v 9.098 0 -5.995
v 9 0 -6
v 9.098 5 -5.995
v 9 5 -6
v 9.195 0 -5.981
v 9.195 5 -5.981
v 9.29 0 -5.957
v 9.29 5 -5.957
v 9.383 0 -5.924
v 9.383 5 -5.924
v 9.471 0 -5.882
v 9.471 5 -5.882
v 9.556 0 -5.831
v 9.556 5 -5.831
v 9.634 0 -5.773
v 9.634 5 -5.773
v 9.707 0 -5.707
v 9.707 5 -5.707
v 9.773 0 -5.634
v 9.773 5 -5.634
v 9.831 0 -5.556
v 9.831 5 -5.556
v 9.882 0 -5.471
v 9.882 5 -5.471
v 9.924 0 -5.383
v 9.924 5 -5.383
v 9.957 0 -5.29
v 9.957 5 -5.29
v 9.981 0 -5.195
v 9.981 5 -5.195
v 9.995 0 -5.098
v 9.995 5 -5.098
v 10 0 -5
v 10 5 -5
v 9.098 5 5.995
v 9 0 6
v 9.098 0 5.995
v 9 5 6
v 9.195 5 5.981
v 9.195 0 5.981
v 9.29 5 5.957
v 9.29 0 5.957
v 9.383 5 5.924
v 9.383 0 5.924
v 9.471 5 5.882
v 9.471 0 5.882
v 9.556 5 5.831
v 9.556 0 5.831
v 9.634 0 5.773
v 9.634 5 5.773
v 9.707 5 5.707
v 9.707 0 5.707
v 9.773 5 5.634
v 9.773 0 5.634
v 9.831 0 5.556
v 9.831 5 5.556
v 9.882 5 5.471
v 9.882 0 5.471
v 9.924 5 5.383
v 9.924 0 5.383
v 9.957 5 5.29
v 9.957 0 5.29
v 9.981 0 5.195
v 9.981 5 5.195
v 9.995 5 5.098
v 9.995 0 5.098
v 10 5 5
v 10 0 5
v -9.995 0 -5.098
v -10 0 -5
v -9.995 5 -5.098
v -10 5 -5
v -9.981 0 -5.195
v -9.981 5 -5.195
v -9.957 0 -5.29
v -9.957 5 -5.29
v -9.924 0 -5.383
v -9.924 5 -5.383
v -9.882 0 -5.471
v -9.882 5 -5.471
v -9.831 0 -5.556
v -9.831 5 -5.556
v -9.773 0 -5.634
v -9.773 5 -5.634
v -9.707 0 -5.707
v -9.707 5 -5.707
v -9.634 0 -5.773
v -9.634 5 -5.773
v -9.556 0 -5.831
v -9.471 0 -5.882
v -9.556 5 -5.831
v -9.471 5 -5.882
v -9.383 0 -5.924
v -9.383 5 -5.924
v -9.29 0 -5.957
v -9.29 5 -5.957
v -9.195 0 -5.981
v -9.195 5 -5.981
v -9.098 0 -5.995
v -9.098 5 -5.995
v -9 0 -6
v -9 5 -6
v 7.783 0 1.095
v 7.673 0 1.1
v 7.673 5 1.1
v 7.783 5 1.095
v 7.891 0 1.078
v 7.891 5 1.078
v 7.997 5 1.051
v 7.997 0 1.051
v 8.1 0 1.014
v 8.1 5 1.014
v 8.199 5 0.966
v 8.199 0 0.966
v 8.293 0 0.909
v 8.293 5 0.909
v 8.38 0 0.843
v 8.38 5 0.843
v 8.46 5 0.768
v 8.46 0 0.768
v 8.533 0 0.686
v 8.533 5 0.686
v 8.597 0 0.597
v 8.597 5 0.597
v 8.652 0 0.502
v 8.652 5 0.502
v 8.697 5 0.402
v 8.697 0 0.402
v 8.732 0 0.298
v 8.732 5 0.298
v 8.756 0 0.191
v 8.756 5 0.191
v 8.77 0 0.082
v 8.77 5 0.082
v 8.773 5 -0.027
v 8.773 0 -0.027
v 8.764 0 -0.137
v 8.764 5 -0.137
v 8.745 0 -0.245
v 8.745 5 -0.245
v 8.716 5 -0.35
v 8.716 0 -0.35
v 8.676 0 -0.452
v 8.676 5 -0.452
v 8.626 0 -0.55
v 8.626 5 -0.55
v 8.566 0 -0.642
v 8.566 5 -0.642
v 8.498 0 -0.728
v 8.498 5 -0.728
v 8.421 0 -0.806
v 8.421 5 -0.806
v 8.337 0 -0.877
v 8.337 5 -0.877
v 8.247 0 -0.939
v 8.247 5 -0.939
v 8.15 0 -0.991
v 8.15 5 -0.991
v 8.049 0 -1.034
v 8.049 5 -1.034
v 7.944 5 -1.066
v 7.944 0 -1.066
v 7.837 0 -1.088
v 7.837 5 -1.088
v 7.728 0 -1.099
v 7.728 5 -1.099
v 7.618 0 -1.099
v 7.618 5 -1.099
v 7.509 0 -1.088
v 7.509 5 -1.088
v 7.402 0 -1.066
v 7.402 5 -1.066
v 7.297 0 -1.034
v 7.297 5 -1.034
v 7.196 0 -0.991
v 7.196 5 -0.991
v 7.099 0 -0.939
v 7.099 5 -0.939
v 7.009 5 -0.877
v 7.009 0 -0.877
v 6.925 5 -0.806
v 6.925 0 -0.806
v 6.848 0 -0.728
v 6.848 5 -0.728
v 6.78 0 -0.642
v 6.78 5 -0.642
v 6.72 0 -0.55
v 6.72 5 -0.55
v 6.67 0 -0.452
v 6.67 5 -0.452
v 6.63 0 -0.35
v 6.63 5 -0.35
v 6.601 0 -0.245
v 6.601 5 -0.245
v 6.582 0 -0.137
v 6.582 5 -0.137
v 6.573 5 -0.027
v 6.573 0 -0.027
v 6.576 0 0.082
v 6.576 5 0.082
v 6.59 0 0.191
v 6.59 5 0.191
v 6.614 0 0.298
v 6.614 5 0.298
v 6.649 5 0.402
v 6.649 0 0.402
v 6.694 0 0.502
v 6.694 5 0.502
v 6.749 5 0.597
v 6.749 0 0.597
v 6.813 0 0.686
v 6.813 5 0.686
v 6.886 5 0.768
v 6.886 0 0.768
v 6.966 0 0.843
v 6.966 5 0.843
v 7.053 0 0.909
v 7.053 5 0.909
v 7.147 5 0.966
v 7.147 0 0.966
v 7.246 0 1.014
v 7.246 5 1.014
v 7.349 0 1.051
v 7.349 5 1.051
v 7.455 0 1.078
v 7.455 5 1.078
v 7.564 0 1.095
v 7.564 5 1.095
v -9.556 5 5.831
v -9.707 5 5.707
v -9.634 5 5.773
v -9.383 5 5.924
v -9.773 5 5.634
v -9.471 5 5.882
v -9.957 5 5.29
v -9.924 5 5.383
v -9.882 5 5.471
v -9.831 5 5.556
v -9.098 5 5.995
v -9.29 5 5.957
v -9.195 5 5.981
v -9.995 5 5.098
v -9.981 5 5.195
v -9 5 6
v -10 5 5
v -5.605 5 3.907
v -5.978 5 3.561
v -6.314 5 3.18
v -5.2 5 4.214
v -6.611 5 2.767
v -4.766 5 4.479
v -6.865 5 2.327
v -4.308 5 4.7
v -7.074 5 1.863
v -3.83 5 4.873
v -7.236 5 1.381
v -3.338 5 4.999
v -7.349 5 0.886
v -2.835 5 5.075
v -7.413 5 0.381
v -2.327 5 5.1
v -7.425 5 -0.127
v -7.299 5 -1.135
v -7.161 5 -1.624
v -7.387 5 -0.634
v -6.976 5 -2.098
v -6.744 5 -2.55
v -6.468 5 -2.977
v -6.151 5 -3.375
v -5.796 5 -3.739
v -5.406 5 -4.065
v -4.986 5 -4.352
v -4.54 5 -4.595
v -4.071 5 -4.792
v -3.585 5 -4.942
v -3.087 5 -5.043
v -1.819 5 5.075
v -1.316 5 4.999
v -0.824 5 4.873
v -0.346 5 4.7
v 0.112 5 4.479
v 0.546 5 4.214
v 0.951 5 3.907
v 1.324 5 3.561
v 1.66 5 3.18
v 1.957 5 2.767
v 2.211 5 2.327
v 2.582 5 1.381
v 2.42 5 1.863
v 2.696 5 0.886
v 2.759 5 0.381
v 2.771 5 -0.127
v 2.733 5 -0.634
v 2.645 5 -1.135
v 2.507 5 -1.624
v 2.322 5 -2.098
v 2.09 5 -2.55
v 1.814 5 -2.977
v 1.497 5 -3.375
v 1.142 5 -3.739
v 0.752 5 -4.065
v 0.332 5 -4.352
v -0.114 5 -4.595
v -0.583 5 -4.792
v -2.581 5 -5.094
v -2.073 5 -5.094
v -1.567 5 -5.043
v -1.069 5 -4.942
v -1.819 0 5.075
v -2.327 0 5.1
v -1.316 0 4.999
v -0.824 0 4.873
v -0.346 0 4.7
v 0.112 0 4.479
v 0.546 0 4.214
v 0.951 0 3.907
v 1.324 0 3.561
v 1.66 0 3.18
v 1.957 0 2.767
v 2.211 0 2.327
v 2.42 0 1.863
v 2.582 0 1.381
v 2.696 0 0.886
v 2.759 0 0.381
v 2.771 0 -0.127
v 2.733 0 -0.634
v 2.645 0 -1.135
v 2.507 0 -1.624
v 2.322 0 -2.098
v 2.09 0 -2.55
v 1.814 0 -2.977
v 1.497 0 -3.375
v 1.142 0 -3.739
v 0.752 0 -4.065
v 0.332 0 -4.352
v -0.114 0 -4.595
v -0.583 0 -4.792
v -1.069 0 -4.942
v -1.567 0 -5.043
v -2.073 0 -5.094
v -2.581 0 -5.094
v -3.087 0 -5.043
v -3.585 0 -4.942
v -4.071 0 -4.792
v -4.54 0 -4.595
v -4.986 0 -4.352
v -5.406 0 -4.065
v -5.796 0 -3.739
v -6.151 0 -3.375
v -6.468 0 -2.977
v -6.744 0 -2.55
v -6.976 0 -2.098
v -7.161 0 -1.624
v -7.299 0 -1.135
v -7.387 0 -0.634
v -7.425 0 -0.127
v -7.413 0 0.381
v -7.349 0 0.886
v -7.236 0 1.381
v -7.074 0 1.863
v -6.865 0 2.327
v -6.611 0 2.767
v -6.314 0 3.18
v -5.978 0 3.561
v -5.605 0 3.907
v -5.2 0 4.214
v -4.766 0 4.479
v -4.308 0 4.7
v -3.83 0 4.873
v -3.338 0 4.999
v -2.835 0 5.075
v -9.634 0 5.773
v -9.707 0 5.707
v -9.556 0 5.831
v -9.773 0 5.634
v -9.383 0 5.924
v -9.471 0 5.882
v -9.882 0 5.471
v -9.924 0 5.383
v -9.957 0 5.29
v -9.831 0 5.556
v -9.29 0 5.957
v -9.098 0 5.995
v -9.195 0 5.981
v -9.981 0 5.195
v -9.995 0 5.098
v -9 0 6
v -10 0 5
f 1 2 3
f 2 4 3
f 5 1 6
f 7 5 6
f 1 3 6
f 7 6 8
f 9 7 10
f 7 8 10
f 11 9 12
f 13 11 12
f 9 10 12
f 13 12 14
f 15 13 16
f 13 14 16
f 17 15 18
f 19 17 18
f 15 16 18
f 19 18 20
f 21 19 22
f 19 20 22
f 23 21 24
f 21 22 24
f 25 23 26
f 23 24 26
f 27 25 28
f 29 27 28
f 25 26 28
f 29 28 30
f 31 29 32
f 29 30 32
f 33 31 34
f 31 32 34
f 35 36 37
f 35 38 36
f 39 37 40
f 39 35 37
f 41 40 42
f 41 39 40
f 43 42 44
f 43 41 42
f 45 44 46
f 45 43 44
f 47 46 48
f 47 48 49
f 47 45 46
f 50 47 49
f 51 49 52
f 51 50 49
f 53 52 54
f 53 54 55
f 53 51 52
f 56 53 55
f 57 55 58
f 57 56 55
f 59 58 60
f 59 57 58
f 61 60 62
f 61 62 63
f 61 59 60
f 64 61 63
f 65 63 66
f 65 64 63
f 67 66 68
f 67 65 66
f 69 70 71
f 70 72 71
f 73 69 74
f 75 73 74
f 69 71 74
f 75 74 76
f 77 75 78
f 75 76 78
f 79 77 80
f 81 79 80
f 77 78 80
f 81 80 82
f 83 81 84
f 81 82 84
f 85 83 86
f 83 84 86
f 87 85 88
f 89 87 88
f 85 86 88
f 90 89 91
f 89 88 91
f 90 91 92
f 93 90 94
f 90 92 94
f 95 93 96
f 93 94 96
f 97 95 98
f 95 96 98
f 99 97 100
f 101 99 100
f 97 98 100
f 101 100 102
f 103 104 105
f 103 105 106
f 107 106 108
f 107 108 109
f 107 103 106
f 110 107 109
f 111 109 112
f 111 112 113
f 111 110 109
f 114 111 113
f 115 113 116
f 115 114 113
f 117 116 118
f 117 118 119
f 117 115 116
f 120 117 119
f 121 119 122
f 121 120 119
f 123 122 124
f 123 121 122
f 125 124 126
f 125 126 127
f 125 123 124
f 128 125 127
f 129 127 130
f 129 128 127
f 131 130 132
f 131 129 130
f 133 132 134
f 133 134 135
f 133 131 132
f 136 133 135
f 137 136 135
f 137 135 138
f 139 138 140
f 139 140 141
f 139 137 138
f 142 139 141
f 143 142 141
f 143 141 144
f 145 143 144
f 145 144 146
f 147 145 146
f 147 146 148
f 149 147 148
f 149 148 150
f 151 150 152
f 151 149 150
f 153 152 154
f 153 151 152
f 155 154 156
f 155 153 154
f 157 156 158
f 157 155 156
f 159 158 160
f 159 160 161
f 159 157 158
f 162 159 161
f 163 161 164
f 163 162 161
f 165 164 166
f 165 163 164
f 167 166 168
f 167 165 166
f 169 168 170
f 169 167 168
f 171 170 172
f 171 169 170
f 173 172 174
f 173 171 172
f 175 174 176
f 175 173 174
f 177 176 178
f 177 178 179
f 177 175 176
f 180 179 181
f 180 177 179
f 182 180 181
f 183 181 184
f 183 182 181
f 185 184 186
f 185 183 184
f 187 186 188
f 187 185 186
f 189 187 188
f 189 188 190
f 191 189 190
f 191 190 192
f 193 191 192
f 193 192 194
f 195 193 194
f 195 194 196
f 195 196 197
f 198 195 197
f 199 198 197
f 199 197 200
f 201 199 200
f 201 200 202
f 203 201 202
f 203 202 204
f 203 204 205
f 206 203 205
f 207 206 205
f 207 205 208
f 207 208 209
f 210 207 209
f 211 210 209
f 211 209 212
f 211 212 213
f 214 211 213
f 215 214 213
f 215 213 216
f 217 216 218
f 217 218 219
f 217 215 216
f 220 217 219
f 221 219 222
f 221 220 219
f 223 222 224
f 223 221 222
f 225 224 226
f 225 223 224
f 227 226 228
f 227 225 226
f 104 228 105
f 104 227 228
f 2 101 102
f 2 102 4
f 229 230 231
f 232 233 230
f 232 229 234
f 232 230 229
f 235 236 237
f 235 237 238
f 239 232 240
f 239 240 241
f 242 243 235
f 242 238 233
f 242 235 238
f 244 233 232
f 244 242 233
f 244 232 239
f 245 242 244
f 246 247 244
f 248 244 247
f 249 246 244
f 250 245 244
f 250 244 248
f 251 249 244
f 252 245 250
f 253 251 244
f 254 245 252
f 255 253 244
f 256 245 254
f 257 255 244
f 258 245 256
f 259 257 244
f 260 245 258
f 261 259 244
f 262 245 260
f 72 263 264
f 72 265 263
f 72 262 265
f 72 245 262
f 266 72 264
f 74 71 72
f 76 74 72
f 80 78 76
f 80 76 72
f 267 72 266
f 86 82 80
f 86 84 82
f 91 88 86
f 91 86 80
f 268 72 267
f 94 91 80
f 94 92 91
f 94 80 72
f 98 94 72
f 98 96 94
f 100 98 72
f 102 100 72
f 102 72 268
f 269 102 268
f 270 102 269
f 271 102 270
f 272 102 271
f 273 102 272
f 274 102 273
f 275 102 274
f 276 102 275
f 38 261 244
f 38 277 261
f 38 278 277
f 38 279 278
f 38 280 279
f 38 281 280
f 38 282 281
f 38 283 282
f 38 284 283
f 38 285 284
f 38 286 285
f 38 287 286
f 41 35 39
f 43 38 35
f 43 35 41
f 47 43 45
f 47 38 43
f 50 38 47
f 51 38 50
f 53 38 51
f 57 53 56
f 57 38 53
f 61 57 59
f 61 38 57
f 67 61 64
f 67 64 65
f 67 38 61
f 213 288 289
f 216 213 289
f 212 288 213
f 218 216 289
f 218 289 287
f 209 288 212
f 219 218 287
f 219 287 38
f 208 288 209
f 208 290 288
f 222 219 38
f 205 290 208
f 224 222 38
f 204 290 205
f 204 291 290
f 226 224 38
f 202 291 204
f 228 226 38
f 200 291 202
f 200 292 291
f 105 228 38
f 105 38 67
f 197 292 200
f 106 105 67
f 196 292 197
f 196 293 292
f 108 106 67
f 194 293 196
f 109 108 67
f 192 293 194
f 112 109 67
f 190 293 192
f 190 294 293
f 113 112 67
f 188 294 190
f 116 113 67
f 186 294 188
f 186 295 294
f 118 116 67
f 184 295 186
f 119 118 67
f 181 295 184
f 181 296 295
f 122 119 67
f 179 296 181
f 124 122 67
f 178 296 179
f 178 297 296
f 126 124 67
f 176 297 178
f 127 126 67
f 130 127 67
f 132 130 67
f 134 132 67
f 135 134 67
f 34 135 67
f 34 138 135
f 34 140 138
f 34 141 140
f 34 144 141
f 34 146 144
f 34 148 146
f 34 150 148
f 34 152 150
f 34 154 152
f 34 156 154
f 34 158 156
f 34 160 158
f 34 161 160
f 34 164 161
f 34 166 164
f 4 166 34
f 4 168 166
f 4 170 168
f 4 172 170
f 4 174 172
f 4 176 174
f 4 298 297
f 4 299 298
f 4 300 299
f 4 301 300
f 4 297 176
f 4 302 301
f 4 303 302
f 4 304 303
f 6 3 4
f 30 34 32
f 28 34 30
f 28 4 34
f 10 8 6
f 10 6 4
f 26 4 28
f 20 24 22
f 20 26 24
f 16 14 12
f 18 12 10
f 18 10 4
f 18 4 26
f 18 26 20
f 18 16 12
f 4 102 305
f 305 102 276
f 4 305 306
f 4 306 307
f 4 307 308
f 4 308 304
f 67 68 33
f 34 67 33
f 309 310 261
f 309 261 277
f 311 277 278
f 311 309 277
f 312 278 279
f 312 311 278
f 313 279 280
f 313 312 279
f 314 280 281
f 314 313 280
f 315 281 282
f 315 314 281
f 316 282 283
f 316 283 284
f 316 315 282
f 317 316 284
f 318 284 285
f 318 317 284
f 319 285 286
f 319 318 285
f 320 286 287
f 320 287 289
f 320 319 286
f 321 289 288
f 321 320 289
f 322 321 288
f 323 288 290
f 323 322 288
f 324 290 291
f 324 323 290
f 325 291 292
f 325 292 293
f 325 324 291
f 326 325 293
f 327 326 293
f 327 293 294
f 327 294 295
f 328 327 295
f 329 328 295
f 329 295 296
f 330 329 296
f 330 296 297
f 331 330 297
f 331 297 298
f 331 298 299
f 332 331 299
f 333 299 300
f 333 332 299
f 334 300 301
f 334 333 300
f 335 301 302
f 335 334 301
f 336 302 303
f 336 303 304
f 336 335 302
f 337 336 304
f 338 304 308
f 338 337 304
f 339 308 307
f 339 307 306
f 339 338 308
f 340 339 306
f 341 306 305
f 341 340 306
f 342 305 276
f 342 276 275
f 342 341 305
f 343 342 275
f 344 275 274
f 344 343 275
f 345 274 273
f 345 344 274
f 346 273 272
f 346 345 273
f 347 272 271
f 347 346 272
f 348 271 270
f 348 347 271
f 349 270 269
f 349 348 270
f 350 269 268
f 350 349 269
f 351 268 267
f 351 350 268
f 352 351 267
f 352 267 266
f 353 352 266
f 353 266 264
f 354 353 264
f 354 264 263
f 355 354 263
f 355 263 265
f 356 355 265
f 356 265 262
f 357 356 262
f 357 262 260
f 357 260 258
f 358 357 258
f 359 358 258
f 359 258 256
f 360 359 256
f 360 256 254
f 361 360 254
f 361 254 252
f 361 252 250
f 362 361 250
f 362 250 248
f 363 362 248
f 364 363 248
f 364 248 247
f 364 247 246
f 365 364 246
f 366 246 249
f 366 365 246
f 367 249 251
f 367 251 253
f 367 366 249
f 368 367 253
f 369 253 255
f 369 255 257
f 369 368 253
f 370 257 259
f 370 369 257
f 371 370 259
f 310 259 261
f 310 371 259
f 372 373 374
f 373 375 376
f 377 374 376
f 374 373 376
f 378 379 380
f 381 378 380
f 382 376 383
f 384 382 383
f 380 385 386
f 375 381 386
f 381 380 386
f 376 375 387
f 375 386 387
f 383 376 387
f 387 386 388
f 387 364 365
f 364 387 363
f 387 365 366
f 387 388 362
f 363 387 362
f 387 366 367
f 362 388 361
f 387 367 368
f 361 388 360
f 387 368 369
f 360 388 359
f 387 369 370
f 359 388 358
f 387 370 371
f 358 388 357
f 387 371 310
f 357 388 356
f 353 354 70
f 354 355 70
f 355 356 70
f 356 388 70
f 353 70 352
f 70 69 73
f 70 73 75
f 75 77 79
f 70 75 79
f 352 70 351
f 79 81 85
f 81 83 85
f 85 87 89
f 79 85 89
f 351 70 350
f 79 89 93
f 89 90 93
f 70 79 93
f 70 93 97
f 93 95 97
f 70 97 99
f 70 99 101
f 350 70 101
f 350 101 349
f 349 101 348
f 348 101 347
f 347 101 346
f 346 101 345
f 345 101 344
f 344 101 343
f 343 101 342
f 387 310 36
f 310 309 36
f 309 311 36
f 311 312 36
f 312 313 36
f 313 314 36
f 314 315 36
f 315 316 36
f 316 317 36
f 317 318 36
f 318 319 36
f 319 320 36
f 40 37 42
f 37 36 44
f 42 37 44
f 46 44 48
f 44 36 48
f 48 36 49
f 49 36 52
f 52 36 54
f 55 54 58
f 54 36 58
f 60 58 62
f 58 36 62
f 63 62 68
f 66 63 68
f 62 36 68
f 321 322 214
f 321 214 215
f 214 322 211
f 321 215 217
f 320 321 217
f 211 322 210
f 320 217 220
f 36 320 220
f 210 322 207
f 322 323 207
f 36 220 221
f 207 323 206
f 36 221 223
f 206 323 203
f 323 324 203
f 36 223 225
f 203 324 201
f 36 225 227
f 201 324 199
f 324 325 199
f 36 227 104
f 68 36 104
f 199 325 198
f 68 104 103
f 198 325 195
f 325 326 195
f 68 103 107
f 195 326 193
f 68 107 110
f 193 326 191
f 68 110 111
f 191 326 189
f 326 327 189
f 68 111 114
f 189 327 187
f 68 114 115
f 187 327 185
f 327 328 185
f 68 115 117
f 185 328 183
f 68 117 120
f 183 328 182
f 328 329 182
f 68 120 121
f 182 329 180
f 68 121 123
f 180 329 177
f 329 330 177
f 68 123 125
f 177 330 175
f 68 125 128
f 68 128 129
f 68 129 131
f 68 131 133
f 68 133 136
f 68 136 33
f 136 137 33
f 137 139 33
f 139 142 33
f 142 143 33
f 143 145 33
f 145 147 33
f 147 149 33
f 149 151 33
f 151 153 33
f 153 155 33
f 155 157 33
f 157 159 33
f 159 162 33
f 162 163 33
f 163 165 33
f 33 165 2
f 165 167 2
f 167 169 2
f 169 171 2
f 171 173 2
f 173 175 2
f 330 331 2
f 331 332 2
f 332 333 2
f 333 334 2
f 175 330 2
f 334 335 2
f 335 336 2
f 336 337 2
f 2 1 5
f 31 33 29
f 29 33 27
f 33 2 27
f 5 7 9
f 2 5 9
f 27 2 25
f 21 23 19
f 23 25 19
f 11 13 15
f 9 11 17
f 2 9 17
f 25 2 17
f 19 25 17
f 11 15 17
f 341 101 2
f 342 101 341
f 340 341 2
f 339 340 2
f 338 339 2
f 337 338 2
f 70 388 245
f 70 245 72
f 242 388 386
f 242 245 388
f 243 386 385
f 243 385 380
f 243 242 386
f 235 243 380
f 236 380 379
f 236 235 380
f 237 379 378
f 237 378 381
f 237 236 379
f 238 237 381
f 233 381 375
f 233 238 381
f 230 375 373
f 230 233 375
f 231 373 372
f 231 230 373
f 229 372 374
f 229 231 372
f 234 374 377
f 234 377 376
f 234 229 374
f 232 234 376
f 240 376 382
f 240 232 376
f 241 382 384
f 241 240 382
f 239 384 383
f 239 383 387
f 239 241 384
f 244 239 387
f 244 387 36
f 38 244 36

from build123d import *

# Parameters (mm, degrees)
SKETCH1_W           = 20
SKETCH1_H           = 12
SKETCH1_R           = 5.1
SKETCH1_R_2         = 1.1
BOSS_EXTRUDE1_DEPTH = 5
FILLET1_R           = 1


with BuildPart() as part:
    # Sketch1 → Boss-Extrude1 (new body)
    with BuildSketch(Plane(origin=(0, 0, 0), x_dir=(1, 0, 0), z_dir=(0, 1, 0))):
        Rectangle(SKETCH1_W, SKETCH1_H)
        with Locations(Location((-2.32697534, 0, 0), (0, 0, 270))):
            Circle(SKETCH1_R, mode=Mode.SUBTRACT)
        with Locations(Location((7.67302466, 0, 0), (0, 0, 270))):
            Circle(SKETCH1_R_2, mode=Mode.SUBTRACT)
    extrude(amount=BOSS_EXTRUDE1_DEPTH)

    # Fillet1
    fillet1_edges = [part.edges().sort_by_distance(p)[0] for p in [
        (-10, 2.5, -6),
        (10, 2.5, -6),
        (10, 2.5, 6),
        (-10, 2.5, 6),
    ]]
    fillet(fillet1_edges, radius=FILLET1_R)


solid = part.part
